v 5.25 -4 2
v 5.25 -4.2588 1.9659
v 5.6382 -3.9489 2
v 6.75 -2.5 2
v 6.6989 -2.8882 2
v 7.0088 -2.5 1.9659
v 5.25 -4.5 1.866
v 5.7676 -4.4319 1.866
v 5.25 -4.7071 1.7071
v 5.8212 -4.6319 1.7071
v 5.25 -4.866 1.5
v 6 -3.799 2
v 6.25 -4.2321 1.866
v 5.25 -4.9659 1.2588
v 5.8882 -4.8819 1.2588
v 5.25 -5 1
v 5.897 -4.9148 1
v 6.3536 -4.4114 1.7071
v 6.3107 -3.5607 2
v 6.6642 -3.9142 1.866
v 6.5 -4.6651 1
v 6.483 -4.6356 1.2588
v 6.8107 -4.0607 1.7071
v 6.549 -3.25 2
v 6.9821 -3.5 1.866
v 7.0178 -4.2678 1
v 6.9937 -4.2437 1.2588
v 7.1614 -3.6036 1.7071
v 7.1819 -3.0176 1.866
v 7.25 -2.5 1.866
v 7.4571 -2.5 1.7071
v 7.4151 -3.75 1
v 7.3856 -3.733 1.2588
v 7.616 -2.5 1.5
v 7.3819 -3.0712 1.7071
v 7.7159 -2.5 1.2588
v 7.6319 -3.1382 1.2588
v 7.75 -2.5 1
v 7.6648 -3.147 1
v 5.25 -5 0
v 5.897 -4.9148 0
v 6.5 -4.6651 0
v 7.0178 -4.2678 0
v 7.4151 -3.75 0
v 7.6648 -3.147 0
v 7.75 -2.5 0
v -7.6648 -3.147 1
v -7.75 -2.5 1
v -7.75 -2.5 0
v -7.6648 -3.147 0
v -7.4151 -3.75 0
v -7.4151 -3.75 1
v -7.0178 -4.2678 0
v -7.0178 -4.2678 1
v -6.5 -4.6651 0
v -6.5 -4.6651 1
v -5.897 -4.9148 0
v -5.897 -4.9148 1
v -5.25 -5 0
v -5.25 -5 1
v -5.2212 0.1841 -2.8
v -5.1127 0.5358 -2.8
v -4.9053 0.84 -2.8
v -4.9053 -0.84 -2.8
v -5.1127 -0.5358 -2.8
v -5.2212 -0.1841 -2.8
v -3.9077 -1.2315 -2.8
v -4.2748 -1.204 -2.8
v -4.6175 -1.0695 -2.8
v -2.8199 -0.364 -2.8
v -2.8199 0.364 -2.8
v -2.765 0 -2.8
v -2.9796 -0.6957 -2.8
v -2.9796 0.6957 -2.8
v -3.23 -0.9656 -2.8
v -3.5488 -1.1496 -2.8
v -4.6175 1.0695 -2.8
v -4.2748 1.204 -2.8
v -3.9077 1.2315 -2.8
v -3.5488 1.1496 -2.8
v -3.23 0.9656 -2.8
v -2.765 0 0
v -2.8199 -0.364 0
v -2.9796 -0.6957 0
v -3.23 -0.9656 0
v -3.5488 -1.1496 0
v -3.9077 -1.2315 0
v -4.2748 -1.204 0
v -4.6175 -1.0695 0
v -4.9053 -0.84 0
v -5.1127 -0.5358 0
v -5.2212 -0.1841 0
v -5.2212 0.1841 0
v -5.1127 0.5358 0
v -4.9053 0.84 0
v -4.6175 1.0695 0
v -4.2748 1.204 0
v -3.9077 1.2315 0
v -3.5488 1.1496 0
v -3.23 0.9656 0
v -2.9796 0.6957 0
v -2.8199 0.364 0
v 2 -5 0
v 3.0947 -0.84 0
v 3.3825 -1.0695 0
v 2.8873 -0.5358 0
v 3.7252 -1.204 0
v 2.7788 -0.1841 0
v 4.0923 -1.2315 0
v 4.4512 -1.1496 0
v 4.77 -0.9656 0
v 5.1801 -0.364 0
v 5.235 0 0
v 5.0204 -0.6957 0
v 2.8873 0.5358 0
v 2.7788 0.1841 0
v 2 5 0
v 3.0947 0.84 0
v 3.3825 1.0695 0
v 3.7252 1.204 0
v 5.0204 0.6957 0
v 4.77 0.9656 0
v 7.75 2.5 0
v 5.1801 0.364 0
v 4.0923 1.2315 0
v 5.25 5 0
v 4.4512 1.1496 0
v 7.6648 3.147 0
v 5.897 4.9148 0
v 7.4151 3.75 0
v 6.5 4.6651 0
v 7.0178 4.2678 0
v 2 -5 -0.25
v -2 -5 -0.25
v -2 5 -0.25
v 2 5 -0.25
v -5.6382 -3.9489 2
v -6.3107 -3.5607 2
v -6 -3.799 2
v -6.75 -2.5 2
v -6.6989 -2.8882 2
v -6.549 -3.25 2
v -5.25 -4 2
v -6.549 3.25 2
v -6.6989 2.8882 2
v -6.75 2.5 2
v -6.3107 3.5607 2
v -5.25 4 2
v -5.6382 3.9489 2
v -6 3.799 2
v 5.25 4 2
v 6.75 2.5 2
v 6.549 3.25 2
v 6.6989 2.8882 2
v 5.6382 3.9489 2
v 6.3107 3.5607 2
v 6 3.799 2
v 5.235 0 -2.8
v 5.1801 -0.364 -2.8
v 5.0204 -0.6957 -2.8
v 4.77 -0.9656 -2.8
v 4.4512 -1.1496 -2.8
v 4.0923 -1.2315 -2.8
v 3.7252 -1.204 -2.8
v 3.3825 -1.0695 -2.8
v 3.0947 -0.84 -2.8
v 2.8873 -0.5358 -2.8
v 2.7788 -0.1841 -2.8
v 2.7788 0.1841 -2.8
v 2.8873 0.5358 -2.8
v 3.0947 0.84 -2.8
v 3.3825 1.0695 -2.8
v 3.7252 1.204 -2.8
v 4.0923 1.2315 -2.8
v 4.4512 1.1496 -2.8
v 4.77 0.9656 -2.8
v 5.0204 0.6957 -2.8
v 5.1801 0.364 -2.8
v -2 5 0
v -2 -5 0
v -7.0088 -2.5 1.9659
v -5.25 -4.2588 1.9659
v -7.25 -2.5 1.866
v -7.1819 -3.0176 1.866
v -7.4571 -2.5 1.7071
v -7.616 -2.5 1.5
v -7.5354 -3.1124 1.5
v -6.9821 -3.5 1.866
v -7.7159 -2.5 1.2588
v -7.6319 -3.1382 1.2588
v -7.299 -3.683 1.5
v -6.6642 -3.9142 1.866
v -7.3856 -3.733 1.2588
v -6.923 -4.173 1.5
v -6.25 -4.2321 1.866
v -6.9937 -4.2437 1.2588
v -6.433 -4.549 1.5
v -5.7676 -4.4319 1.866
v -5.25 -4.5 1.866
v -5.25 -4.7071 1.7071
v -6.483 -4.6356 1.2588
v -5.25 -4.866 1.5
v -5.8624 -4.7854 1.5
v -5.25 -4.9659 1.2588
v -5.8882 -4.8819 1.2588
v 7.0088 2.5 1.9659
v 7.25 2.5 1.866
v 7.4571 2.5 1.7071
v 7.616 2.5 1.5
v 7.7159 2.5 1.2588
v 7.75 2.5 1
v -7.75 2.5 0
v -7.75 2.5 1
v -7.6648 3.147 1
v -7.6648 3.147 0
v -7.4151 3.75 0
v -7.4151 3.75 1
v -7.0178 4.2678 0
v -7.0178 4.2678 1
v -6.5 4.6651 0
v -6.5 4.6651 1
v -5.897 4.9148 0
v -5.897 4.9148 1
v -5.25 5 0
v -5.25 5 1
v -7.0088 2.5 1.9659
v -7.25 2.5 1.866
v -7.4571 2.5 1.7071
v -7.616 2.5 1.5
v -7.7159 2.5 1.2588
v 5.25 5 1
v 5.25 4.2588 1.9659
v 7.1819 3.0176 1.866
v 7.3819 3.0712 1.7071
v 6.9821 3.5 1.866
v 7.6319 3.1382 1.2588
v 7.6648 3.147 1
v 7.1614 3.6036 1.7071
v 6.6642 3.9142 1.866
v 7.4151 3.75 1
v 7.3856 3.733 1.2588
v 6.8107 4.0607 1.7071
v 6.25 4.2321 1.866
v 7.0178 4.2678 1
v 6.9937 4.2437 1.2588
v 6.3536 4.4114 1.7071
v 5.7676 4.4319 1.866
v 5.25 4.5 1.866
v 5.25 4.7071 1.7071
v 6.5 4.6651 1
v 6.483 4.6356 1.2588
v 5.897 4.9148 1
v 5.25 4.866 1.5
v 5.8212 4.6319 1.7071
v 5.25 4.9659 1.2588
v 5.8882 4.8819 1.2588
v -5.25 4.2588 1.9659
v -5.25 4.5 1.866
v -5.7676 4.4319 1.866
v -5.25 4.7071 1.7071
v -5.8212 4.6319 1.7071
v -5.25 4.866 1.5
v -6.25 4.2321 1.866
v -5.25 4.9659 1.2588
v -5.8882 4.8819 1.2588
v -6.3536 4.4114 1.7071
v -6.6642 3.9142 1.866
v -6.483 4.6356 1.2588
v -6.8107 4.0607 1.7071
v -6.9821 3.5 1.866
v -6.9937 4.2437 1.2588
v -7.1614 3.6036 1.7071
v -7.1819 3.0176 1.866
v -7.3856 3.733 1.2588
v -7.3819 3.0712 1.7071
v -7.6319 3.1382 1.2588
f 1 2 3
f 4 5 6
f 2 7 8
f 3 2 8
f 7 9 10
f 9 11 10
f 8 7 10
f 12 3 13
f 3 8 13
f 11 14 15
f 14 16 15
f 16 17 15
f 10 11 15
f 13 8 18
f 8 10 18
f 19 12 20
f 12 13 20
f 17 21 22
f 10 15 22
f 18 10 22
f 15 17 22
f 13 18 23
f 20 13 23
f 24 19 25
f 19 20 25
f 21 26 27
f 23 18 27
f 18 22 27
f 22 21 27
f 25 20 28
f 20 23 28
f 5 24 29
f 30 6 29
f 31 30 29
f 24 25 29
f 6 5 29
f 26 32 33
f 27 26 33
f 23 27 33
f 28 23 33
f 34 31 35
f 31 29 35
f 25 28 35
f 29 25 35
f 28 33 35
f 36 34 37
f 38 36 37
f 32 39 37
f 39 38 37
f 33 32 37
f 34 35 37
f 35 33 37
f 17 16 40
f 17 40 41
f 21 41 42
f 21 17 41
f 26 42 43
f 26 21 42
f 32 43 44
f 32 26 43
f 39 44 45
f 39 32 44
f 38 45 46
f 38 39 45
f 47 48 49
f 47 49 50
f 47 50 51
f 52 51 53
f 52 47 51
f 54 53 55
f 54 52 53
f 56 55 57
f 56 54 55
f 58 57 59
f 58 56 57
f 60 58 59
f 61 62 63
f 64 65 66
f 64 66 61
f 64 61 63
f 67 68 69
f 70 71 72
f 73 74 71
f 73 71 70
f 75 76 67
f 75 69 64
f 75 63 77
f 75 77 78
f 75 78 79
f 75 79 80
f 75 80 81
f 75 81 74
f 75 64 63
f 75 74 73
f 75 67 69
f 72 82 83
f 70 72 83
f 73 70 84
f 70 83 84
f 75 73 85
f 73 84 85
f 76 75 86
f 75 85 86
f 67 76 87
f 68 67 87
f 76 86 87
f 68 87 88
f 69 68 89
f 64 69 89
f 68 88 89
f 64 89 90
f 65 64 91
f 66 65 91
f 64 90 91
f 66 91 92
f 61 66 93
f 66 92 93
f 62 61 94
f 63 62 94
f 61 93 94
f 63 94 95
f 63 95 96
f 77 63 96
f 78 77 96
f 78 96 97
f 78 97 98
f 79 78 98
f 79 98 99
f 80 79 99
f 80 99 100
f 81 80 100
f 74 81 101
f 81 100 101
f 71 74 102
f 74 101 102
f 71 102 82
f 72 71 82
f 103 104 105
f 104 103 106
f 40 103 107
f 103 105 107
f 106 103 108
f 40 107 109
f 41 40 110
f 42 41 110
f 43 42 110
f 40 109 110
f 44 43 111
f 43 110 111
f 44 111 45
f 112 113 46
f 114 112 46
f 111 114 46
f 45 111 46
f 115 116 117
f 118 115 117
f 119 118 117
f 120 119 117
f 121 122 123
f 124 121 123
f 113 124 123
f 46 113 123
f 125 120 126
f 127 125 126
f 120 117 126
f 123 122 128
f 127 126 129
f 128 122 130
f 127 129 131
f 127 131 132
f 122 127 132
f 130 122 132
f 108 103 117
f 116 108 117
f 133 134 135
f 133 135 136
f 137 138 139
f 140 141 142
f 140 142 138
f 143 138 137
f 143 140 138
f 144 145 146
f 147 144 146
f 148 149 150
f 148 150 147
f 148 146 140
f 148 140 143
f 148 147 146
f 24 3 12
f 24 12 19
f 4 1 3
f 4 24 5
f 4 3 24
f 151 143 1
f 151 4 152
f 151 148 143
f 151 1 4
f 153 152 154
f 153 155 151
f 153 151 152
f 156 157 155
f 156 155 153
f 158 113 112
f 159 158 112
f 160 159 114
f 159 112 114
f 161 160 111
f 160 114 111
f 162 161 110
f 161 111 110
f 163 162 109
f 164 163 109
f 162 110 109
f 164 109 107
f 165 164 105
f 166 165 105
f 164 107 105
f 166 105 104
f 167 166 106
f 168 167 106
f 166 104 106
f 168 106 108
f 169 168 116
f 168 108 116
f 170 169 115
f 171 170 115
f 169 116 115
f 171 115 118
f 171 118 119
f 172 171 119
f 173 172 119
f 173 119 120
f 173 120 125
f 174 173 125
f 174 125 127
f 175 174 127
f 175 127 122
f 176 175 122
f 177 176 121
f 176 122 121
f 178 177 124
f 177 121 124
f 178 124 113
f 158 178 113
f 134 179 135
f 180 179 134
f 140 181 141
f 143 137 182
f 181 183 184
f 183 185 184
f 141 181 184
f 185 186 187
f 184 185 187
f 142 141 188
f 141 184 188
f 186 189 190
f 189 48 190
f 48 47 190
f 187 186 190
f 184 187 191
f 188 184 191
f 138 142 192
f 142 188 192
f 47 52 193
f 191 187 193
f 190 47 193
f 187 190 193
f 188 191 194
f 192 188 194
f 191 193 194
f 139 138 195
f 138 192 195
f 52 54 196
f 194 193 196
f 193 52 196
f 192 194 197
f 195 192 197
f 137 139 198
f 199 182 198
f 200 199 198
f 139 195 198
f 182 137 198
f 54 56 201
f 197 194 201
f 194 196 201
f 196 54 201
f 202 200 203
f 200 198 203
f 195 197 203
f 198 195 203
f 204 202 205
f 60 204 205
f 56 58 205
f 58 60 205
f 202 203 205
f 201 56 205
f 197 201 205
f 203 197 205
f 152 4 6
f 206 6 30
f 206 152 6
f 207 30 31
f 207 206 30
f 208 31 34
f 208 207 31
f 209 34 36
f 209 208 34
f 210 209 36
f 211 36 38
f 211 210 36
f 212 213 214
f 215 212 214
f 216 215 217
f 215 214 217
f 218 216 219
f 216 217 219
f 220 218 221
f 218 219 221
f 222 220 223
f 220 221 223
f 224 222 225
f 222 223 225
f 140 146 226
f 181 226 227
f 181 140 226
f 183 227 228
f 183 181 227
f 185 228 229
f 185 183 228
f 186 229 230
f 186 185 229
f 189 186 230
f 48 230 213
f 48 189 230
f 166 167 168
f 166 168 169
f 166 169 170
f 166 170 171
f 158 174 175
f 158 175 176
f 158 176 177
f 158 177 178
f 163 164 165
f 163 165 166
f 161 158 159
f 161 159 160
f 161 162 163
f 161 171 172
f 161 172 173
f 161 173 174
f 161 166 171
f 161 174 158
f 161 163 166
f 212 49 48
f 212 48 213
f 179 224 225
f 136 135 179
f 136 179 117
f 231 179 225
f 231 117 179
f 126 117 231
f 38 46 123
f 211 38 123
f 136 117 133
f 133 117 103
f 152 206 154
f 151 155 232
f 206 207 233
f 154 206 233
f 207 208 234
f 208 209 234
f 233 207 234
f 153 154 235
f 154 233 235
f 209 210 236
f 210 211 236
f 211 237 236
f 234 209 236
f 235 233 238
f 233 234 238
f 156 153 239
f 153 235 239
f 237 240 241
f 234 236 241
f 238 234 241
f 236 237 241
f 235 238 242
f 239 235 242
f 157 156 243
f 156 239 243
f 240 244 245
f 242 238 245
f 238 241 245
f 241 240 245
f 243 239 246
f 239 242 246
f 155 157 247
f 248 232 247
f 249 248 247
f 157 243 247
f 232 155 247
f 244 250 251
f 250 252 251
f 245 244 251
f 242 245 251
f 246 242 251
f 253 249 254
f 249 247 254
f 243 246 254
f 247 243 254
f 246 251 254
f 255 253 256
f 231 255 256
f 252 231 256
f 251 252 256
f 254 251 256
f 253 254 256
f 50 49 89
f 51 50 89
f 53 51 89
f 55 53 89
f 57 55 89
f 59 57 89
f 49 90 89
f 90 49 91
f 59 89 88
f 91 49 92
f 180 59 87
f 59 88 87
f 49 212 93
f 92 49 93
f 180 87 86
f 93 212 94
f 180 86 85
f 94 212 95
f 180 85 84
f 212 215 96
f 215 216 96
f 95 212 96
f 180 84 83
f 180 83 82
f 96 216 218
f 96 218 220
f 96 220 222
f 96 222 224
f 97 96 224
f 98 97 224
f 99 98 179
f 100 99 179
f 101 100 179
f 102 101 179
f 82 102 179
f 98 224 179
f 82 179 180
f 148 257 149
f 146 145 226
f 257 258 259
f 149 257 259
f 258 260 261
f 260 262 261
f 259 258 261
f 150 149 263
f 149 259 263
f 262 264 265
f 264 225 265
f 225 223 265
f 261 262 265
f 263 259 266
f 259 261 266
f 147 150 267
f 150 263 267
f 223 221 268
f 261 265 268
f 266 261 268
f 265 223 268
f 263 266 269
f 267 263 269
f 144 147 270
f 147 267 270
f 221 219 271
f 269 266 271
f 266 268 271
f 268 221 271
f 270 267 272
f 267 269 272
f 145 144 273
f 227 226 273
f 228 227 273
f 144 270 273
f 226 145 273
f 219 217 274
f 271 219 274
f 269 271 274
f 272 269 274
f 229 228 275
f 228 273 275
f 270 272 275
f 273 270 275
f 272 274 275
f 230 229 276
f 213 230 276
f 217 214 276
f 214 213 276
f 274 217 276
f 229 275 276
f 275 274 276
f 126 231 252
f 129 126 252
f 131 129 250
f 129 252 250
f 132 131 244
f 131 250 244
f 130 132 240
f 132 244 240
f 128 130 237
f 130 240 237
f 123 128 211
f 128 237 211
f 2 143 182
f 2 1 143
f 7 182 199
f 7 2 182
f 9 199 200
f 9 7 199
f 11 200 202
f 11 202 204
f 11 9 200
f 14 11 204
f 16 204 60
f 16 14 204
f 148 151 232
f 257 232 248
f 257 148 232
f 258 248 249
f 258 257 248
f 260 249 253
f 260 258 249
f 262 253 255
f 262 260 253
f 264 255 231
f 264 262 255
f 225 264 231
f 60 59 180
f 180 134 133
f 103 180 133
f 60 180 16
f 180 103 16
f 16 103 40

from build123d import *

# Parameters (mm, degrees)
SKETCH_W     = 15.5
SKETCH_H     = 10
PAD_DEPTH    = 2
SKETCH001_R  = 1.235
PAD001_DEPTH = 2.8
FILLET_R     = 2.5
FILLET001_R  = 1
SKETCH002_W  = 4
SKETCH002_H  = 10
PAD002_DEPTH = 0.25


with BuildPart() as part:
    # Sketch → Pad (new body)
    with BuildSketch(Plane.XY):
        Rectangle(SKETCH_W, SKETCH_H)
    extrude(amount=PAD_DEPTH)

    # Sketch001 (on Face5 of Pad) → Pad001 (join)
    with BuildSketch(Plane(origin=(0, 0, 0), x_dir=(1, 0, 0), z_dir=(0, 0, -1))):
        with Locations((-4, 0)):
            Circle(SKETCH001_R)
        with Locations((4, 0)):
            Circle(SKETCH001_R)
    extrude(amount=PAD001_DEPTH)

    # Fillet
    fillet_edges = [part.edges().sort_by_distance(p)[0] for p in [
        (7.75, 5, 1),
        (7.75, -5, 1),
        (-7.75, -5, 1),
        (-7.75, 5, 1),
    ]]
    fillet(fillet_edges, radius=FILLET_R)

    # Fillet001
    fillet001_edges = [part.edges().sort_by_distance(p)[0] for p in [
        (0, -5, 2),
        (7.75, 0, 2),
        (0, 5, 2),
        (-7.75, 0, 2),
    ]]
    fillet(fillet001_edges, radius=FILLET001_R)

    # Sketch002 (on Face4 of Fillet001) → Pad002 (join)
    with BuildSketch(Plane(origin=(0, 0, 0), x_dir=(1, 0, 0), z_dir=(0, 0, -1))):
        Rectangle(SKETCH002_W, SKETCH002_H)
    extrude(amount=PAD002_DEPTH)


solid = part.part
